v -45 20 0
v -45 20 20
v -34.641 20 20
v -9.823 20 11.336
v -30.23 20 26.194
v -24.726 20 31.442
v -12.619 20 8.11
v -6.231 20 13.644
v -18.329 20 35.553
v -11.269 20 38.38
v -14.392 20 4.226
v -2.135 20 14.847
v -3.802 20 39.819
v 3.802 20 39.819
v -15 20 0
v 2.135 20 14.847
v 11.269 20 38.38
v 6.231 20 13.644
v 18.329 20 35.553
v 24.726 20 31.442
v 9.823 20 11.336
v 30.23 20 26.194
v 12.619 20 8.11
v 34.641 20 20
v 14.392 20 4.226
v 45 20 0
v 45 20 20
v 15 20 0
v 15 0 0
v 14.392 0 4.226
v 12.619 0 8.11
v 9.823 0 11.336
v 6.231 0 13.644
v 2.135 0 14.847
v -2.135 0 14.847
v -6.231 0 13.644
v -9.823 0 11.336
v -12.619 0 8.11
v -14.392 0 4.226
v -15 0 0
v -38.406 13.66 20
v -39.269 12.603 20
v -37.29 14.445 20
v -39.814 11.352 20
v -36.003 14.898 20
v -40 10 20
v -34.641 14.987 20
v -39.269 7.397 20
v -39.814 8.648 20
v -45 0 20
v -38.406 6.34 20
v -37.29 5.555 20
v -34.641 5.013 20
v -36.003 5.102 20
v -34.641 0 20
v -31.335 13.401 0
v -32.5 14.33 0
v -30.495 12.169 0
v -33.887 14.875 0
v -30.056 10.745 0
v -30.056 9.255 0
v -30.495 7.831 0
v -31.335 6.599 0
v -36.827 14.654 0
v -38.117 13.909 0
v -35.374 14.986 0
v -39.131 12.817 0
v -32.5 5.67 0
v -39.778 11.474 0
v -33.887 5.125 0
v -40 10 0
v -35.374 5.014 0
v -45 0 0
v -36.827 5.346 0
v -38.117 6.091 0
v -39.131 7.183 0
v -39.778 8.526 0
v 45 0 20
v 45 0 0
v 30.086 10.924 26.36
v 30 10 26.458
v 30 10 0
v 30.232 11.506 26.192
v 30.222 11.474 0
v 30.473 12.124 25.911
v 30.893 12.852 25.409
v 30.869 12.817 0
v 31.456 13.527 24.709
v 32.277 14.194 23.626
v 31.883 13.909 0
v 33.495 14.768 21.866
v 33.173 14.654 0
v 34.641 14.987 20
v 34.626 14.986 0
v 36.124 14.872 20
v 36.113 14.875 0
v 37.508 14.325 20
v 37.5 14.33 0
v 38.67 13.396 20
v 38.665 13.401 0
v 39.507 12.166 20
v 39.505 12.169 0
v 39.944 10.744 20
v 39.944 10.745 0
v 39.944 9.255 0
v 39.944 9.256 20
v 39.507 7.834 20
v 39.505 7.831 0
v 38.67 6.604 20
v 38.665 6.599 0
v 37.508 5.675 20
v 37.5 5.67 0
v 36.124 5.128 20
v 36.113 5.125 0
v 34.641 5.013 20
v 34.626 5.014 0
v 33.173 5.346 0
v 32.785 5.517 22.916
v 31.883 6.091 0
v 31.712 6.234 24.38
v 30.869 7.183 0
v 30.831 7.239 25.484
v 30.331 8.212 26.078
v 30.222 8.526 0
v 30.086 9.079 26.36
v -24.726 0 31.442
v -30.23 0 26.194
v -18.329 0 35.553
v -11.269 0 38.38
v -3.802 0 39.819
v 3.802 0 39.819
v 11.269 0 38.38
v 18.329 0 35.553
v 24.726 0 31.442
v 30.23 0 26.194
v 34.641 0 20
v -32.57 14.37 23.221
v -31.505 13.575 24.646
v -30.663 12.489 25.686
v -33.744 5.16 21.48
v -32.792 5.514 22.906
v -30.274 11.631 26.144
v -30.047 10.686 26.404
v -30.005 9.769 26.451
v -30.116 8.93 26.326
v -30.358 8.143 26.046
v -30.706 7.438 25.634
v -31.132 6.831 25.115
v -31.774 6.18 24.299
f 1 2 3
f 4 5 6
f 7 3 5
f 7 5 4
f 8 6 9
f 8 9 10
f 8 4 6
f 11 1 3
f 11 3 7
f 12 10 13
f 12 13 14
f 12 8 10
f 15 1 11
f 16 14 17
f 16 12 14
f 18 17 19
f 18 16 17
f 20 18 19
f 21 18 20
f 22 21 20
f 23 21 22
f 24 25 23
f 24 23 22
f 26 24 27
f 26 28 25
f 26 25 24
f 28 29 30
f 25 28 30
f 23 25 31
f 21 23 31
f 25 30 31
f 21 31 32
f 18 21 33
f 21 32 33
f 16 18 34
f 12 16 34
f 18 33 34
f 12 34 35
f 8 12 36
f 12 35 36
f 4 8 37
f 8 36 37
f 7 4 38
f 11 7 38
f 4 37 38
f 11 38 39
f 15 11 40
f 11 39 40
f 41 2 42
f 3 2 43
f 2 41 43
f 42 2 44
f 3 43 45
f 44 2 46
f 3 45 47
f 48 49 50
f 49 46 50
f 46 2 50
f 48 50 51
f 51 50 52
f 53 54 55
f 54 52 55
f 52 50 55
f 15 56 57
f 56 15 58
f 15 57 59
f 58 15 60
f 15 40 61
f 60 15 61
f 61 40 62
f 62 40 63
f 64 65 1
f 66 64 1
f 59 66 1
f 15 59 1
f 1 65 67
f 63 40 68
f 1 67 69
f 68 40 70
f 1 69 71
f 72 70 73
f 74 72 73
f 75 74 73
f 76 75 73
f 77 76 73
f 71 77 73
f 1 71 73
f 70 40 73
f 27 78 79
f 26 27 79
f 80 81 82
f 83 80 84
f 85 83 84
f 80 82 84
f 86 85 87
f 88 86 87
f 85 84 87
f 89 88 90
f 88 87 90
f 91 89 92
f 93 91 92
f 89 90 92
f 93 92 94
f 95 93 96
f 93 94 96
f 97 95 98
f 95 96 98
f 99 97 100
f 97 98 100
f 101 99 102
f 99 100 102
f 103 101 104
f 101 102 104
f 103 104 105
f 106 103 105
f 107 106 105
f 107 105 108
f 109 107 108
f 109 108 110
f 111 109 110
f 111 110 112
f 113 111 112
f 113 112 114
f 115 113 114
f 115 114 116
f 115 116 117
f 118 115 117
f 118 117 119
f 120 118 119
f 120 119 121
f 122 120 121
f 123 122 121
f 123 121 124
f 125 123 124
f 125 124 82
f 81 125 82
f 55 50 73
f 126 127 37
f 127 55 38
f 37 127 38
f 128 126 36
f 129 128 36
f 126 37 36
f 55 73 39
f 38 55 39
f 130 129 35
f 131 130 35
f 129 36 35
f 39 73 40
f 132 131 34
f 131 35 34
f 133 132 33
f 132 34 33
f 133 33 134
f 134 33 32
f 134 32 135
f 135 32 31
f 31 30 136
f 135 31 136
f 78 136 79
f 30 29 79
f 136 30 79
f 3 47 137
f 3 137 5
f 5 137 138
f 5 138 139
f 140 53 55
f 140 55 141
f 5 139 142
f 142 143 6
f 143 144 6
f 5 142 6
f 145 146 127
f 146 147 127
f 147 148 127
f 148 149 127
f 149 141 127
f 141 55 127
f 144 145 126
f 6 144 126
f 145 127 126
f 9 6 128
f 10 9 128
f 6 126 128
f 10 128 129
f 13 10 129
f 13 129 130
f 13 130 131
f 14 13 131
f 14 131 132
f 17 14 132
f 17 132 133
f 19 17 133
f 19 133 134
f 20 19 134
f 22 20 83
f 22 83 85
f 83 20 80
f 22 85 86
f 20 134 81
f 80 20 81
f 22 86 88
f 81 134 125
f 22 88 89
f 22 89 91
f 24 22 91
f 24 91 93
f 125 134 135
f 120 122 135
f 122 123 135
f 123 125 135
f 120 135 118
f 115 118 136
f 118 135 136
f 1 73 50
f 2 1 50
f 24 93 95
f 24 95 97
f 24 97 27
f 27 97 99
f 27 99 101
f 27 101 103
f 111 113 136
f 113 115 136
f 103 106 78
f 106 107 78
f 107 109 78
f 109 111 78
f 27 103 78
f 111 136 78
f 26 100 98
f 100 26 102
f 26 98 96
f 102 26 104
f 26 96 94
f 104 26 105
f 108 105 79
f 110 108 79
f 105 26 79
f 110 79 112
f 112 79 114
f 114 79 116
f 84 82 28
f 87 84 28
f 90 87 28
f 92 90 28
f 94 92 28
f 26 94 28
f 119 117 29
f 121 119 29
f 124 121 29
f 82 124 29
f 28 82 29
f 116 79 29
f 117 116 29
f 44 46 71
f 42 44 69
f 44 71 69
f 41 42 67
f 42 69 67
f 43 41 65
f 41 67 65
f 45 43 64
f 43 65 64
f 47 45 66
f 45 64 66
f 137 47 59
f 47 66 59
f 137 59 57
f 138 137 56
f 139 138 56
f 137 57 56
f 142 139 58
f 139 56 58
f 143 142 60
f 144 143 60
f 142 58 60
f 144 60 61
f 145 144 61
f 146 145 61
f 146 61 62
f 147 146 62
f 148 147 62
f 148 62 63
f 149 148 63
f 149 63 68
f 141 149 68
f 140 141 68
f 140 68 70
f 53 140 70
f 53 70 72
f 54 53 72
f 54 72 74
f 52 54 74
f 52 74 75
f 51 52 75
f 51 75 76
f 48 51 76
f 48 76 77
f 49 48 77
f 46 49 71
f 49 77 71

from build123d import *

# Parameters (mm, degrees)
BOSS_EXTRUDE1_DEPTH = 20
SKETCH2_R           = 5
CUT_EXTRUDE1_DEPTH  = 41


with BuildPart() as part:
    # Sketch1 → Boss-Extrude1 (new body)
    with BuildSketch(Plane(origin=(0, 0, 0), x_dir=(1, 0, 0), z_dir=(0, 1, 0))):
        with BuildLine():
            ThreePointArc((-34.641016151, -20), (-38.637033052, -10.352761804), (-40, 0))
            Line((-40, 0), (-45, 0))
            Line((-45, 0), (-45, -20))
            Line((-45, -20), (-34.641016151, -20))
        make_face()
        with BuildLine():
            Line((40, 0), (15, 0))
            ThreePointArc((15, 0), (0, -15), (-15, 0))
            Line((-15, 0), (-40, 0))
            ThreePointArc((-40, 0), (-38.637033052, -10.352761804), (-34.641016151, -20))
            Line((-34.641016151, -20), (34.641016151, -20))
            ThreePointArc((34.641016151, -20), (38.637033052, -10.352761804), (40, 0))
        make_face()
        with BuildLine():
            ThreePointArc((-34.641016151, -20), (0, -40), (34.641016151, -20))
            Line((34.641016151, -20), (-34.641016151, -20))
        make_face()
        with BuildLine():
            Line((45, 0), (40, 0))
            ThreePointArc((40, 0), (38.637033052, -10.352761804), (34.641016151, -20))
            Line((34.641016151, -20), (45, -20))
            Line((45, -20), (45, 0))
        make_face()
    extrude(amount=BOSS_EXTRUDE1_DEPTH)

    # Sketch2 → Cut-Extrude1 (cut, through all)
    with BuildSketch(Plane(origin=(0, 0, 0), x_dir=(-1, 0, 0), z_dir=(0, 0, -1))):
        with Locations((-35, 10)):
            Circle(SKETCH2_R)
        with Locations((35, 10)):
            Circle(SKETCH2_R)
    extrude(amount=-CUT_EXTRUDE1_DEPTH, mode=Mode.SUBTRACT)


solid = part.part
